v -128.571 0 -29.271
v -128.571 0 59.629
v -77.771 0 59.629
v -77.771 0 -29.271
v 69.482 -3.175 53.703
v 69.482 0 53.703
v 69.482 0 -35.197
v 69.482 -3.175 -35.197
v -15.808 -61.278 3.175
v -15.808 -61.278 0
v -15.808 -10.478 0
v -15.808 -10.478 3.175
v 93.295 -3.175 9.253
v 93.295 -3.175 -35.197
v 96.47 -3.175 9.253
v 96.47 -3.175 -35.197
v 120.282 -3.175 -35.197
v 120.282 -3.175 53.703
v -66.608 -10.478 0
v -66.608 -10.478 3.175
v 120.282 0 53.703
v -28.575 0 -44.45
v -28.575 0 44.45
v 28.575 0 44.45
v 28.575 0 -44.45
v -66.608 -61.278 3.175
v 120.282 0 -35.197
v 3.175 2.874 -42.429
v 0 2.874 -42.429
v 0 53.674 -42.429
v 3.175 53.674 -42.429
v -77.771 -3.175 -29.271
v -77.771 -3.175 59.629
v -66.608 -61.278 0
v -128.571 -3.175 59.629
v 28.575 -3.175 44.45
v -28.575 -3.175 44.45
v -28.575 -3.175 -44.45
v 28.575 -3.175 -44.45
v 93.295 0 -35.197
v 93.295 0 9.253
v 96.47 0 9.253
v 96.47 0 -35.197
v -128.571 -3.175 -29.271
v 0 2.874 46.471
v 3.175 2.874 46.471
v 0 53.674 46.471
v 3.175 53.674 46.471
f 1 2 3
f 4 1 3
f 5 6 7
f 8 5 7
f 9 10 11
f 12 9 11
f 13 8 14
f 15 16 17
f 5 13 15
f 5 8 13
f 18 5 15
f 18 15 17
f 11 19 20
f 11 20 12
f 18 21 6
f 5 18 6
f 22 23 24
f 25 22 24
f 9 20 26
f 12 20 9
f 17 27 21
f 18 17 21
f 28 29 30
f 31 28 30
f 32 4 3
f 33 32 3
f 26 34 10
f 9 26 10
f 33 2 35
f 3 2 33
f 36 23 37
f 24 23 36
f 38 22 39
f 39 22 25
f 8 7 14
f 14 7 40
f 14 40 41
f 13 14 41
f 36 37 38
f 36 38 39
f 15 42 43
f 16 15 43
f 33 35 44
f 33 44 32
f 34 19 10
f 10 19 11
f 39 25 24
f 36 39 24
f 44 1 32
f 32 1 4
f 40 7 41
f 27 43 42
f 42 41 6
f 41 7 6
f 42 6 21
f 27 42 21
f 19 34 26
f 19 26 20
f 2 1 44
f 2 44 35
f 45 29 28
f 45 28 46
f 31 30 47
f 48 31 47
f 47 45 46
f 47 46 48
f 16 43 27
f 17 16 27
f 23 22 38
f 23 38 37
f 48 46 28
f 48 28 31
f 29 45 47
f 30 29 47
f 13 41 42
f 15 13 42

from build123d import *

# Parameters (mm, degrees)
F0_W      = 57.15
F0_H      = 88.9
F1_DEPTH  = 3.175
F4_W      = 50.8
F4_H      = 88.9
F5_DEPTH  = 3.175
F6_W      = 50.8
F6_H      = 50.8
F7_DEPTH  = 3.175
F8_W      = 50.8
F8_H      = 88.9
F9_DEPTH  = 3.175
F11_DEPTH = 3.175


with BuildPart() as f1:
    # F0 (on Front) → F1 (new body)
    with BuildSketch(Plane.XZ):
        Rectangle(F0_W, F0_H)
    extrude(amount=F1_DEPTH)


with BuildPart() as f2_1:
    # F2: copy of F1
    add(f1.part)


with BuildPart() as f5:
    # F4 (on Right) → F5 (new body)
    with BuildSketch(Plane.YZ):
        with Locations((28.274211, 2.020991)):
            Rectangle(F4_W, F4_H)
    extrude(amount=F5_DEPTH)


with BuildPart() as f7:
    # F6 (on Top) → F7 (new body)
    with BuildSketch(Plane.XY):
        with Locations((-41.208157, -35.878065)):
            Rectangle(F6_W, F6_H)
    extrude(amount=F7_DEPTH)


with BuildPart() as f9:
    # F8 (on Front) → F9 (new body)
    with BuildSketch(Plane.XZ):
        with Locations((-103.17079, 15.179067)):
            Rectangle(F8_W, F8_H)
    extrude(amount=F9_DEPTH)


with BuildPart() as f11:
    # F10 (on Front) → F11 (new body)
    with BuildSketch(Plane.XZ):
        Polygon((120.282365, 53.70251), (69.482365, 53.70251), (69.482365, -35.19749), (93.294865, -35.19749), (93.294865, 9.25251), (96.469865, 9.25251), (96.469865, -35.19749), (120.282365, -35.19749), align=None)
    extrude(amount=F11_DEPTH)


solid = Compound([f1.part, f5.part, f7.part, f9.part, f11.part])
